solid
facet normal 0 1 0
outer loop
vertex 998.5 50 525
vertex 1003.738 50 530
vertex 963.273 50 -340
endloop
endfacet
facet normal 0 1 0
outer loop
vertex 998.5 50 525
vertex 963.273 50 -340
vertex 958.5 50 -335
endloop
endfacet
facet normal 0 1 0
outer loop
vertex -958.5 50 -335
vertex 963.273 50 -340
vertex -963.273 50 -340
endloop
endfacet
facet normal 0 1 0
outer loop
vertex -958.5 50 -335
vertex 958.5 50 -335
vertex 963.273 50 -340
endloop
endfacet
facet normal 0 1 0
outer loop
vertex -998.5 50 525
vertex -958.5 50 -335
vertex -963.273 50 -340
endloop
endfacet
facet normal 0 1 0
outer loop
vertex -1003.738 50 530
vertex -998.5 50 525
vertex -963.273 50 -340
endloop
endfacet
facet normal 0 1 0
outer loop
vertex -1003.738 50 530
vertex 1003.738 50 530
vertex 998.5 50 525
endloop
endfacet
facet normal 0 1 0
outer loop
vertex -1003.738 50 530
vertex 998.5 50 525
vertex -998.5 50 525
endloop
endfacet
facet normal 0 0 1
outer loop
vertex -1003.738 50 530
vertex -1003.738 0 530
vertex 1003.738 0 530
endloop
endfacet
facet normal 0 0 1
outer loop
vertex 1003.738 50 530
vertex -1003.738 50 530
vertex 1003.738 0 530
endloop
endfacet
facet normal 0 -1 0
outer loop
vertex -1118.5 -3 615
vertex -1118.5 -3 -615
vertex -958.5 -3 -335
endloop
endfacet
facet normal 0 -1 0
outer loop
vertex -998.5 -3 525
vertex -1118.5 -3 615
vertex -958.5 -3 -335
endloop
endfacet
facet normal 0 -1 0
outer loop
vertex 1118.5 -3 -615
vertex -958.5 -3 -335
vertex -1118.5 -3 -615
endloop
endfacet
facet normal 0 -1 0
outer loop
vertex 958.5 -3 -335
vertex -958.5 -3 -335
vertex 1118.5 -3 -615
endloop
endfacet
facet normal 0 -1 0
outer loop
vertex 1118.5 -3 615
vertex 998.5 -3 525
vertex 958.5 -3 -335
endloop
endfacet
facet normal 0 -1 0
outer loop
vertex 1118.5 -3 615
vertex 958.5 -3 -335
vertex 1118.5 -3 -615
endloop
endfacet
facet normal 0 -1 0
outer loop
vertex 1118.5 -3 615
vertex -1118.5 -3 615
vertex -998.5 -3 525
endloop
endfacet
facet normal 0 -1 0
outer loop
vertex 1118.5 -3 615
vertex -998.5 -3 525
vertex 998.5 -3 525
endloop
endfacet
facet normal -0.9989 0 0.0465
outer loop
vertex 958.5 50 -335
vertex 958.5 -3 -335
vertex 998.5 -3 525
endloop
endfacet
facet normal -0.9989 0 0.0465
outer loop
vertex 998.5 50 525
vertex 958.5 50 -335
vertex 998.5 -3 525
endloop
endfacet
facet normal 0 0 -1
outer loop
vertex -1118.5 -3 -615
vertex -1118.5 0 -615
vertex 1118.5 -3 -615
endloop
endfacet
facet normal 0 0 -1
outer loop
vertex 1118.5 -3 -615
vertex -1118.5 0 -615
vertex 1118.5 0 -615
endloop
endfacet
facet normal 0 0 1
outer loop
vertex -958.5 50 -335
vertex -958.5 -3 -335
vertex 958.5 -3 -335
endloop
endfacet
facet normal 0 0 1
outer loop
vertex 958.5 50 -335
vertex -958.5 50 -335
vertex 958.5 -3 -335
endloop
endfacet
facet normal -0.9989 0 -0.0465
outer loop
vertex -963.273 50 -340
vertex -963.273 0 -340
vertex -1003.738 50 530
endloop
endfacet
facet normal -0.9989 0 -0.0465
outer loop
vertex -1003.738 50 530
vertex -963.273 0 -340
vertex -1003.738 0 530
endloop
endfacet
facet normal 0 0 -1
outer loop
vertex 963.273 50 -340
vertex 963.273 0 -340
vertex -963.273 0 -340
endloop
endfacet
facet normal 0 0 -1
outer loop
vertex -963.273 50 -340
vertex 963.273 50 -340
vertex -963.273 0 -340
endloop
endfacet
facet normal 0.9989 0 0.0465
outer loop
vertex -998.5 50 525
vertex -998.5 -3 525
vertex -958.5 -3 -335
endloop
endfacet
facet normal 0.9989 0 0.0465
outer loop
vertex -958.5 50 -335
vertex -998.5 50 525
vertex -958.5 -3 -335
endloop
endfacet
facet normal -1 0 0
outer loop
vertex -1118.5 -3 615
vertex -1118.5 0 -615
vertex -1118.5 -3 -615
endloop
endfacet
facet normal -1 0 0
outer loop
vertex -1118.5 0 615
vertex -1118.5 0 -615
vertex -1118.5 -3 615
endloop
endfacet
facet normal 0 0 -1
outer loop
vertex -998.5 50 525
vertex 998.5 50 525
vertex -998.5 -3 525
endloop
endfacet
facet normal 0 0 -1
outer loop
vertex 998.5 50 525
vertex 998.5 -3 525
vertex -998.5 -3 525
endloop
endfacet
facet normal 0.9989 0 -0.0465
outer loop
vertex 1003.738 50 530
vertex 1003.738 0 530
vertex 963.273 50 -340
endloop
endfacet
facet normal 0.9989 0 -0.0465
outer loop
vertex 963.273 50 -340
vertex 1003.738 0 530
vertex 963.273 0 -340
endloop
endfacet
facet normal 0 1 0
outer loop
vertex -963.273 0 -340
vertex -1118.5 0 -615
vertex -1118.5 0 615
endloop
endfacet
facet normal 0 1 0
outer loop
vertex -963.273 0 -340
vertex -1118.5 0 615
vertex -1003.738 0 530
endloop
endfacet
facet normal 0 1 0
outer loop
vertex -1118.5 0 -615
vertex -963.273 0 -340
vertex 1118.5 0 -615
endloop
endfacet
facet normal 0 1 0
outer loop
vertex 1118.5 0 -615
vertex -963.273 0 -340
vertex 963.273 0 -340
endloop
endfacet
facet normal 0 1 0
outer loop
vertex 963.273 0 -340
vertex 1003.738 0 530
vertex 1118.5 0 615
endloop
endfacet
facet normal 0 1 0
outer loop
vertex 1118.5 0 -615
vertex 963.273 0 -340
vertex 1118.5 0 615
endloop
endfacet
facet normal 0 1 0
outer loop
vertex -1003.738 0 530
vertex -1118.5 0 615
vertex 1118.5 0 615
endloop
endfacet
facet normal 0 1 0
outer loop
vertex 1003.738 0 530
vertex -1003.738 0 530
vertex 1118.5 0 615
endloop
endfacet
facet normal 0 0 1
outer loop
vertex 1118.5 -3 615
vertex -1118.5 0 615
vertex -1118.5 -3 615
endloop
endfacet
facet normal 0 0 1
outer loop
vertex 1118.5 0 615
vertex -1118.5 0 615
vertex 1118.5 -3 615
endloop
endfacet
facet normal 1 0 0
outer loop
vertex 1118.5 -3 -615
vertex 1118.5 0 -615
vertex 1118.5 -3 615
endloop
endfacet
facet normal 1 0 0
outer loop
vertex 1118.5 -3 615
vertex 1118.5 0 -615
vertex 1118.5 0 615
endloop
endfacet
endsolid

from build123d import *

# Parameters (mm, degrees)
F0_W     = 2237
F0_H     = 1230
F1_DEPTH = 3
F3_DEPTH = 3.001
F5_DEPTH = 50


with BuildPart() as f1:
    # F0 (on Front) → F1 (new body)
    with BuildSketch(Plane.XZ):
        Rectangle(F0_W, F0_H)
    extrude(amount=F1_DEPTH)

    # F2 (on face) → F3 (cut, through all)
    with BuildSketch(Plane.XZ.offset(3)):
        Polygon((958.5, -335), (998.5, 525), (-998.5, 525), (-958.5, -335), (0, -335), align=None)
    extrude(amount=-F3_DEPTH, mode=Mode.SUBTRACT)

    # F4 (on face) → F5 (join)
    with BuildSketch(Plane(origin=(0, 0, 0), x_dir=(-1, 0, 0), z_dir=(0, 1, 0))):
        Polygon((1003.737964, 530), (-1003.737964, 530), (-963.272847, -340), (963.272847, -340), align=None)
        Polygon((-998.5, 525), (998.5, 525), (958.5, -335), (-958.5, -335), align=None, mode=Mode.SUBTRACT)
    extrude(amount=F5_DEPTH)


solid = f1.part
